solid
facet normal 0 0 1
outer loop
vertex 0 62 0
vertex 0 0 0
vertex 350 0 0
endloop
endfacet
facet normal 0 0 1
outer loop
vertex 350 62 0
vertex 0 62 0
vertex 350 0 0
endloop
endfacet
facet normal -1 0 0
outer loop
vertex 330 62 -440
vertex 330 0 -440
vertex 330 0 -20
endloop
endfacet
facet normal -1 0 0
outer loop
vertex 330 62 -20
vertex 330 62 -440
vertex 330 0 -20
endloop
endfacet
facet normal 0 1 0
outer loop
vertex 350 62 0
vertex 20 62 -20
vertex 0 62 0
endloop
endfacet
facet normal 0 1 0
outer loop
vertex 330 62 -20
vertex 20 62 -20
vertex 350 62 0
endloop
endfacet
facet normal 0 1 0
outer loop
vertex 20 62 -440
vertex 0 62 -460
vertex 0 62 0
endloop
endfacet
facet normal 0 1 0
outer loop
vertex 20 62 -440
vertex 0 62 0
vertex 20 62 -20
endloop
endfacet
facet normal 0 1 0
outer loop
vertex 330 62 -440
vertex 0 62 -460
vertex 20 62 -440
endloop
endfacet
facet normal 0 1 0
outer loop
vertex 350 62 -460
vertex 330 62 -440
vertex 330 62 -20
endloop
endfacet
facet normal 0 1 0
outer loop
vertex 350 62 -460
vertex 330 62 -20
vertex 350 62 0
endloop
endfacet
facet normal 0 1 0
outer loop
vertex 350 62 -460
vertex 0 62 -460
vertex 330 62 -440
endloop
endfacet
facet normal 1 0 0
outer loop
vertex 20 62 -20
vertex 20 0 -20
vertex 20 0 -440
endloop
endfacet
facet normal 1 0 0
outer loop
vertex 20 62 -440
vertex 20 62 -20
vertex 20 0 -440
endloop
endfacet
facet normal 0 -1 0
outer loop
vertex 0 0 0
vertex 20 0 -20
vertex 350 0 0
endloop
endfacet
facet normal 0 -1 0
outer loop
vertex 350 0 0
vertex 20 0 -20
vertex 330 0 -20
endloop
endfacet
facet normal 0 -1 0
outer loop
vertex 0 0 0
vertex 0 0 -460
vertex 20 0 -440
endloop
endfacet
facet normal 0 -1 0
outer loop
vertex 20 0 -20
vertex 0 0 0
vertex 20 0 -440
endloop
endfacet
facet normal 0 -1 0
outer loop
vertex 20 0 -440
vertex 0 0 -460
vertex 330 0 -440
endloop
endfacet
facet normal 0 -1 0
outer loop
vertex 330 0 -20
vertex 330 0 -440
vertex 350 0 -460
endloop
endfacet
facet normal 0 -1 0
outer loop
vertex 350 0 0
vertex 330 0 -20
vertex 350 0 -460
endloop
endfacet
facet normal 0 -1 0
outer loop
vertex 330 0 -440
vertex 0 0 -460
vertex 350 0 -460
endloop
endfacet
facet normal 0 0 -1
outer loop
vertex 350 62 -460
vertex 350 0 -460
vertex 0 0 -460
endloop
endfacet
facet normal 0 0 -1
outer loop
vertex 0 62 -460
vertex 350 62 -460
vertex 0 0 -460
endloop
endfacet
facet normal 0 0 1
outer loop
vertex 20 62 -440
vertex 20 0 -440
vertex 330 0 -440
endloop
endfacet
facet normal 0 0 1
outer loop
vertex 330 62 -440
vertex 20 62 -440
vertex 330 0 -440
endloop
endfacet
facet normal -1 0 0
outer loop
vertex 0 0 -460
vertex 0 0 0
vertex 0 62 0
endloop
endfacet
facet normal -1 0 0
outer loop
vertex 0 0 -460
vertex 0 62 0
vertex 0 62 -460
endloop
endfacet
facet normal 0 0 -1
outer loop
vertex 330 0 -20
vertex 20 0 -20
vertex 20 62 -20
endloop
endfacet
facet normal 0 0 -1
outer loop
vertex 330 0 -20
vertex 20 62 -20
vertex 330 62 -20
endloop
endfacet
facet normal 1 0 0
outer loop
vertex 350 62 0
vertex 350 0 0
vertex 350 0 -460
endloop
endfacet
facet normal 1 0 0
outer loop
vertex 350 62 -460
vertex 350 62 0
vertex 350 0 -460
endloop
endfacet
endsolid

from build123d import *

# Parameters (mm, degrees)
SKETCH1_W           = 310
SKETCH1_H           = 20
SKETCH1_W_2         = 20
SKETCH1_H_2         = 460
BOSS_EXTRUDE1_DEPTH = 62


with BuildPart() as part:
    # Sketch1 → Boss-Extrude1 (new body)
    with BuildSketch(Plane(origin=(0, 0, 0), x_dir=(1, 0, 0), z_dir=(0, 1, 0))):
        with Locations((175, 10)):
            Rectangle(SKETCH1_W, SKETCH1_H)
        with Locations((10, 230)):
            Rectangle(SKETCH1_W_2, SKETCH1_H_2)
        with Locations((175, 450)):
            Rectangle(SKETCH1_W, SKETCH1_H)
        Polygon((330, 20), (330, 0), (350, 0), (350, 460), (330, 460), (330, 440), align=None)
    extrude(amount=BOSS_EXTRUDE1_DEPTH)


solid = part.part
